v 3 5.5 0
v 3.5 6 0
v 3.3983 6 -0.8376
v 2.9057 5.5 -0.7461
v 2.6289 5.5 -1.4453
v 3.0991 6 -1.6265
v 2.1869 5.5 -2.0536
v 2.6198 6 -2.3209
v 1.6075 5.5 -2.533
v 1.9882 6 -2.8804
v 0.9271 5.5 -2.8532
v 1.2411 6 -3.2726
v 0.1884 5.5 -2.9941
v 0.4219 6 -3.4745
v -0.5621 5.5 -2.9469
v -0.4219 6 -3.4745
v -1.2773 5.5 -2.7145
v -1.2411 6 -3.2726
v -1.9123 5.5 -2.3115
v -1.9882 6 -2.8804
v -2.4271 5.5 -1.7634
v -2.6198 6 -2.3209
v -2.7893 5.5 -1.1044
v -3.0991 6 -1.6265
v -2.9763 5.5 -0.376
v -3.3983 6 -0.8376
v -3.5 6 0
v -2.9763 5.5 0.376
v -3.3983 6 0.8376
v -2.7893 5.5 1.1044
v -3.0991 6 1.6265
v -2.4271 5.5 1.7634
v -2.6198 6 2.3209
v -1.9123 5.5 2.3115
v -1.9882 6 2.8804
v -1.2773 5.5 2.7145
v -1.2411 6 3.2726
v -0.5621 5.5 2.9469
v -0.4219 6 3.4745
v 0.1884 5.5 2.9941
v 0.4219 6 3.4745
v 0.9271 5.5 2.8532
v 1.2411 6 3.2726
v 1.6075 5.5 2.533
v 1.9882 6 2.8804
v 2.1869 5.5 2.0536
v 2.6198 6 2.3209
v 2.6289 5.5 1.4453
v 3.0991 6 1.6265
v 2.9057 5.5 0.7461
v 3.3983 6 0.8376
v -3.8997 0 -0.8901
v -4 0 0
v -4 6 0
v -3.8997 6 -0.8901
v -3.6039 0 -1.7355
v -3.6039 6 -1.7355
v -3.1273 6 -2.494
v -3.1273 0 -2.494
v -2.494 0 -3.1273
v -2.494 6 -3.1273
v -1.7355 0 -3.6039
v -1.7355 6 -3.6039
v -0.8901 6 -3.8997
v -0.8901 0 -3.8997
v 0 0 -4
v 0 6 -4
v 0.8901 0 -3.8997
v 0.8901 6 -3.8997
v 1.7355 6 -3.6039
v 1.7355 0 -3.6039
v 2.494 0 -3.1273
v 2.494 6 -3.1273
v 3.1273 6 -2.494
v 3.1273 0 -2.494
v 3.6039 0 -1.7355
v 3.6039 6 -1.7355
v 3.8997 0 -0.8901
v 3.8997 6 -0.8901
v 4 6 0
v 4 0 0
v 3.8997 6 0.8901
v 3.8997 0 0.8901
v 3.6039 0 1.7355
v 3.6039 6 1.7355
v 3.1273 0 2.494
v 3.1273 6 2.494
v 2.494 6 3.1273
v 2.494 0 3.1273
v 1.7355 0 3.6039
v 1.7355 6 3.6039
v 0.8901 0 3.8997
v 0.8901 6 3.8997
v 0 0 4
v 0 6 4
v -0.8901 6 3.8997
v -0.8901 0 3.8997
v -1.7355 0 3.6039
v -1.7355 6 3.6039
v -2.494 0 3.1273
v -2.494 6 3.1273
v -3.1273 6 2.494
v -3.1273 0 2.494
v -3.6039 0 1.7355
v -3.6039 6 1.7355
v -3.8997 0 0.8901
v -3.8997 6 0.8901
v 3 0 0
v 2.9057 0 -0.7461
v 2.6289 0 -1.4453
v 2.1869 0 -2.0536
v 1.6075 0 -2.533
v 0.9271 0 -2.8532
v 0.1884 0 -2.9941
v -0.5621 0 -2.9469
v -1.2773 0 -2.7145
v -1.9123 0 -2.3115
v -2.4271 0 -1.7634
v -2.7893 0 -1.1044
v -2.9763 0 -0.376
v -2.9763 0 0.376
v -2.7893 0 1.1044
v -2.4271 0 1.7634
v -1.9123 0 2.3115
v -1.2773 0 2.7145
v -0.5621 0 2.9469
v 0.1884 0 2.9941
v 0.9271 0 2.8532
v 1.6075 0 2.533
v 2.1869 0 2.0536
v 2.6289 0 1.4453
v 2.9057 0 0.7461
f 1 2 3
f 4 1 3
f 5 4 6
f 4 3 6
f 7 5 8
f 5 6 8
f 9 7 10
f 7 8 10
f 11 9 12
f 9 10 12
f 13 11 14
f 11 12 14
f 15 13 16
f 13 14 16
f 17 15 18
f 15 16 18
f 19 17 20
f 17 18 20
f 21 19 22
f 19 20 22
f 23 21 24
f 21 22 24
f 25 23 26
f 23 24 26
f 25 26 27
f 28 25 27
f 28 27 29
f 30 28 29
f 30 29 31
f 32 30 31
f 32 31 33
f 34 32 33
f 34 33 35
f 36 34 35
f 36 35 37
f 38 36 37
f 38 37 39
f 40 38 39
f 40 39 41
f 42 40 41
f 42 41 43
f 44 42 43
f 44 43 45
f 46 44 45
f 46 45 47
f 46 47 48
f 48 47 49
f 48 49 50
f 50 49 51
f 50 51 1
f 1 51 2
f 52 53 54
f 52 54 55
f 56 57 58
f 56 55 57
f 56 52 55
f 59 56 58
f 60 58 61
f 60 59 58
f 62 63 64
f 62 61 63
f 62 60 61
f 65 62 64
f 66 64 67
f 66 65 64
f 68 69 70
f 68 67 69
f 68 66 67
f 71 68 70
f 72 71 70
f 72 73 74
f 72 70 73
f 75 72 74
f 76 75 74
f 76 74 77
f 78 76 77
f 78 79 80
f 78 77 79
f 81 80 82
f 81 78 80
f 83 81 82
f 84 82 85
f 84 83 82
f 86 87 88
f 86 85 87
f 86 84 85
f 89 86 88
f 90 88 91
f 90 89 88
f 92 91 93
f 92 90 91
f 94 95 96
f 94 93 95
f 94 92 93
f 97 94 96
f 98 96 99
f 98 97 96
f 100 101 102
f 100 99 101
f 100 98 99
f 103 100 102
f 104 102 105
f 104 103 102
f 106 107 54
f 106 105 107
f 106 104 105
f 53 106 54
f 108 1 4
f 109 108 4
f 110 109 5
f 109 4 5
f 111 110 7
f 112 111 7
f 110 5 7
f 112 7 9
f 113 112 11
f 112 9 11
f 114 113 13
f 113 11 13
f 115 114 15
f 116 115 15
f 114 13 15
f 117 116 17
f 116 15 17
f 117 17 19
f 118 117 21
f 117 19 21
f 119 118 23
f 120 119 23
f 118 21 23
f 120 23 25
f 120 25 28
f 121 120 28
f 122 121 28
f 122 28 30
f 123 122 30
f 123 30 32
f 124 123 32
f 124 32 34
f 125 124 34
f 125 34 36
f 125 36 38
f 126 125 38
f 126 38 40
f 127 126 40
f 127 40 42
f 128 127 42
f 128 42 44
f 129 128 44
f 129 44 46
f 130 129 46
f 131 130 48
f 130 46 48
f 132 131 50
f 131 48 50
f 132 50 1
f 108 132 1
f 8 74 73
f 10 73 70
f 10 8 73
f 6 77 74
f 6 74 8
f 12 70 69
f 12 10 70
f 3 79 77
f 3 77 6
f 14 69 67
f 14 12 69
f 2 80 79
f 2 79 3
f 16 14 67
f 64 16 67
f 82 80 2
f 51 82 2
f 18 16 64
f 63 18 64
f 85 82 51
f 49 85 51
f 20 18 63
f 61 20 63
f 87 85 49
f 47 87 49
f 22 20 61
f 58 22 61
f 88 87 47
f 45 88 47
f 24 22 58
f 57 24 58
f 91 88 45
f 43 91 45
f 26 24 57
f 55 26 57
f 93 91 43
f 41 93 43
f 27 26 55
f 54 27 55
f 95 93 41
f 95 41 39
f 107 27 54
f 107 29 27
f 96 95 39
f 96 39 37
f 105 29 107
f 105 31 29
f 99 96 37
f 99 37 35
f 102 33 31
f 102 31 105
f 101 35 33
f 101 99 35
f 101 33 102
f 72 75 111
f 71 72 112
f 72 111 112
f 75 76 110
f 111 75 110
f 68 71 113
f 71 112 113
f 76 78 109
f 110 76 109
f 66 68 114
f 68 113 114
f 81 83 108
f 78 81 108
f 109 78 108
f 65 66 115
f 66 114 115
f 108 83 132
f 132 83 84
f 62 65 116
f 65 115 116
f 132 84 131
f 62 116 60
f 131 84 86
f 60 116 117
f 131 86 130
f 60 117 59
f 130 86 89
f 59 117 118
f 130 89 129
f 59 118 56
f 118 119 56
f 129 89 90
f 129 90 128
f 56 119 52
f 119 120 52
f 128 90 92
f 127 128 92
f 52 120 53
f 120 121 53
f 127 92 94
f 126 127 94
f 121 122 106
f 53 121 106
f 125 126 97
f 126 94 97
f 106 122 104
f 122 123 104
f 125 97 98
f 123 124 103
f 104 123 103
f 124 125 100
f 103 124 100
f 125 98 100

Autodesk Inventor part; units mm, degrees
ref_plane "YZ Plane" through (0, 0, 0) normal (1, 0, 0) x (0, 1, 0)
ref_plane "XZ Plane" through (0, 0, 0) normal (0, 1, 0) x (-1, 0, 0)
ref_plane "XY Plane" through (0, 0, 0) normal (0, 0, 1) x (1, 0, 0)
sketch "Sketch1" plane through (0, 0, 0) normal (0, 1, 0) x (-1, 0, 0)
  circle A0 centre (0, 0) radius 4
  dimension "d0" = 8
extrude "Extrusion1" add sketch "Sketch1" along normal blind 6
sketch "Sketch2" plane through (0, 6, 0) normal (0, 1, 0) x (1, 0, 0)
  circle A0 centre (0, 0) radius 4 projected
  circle A1 centre (0, 0) radius 3
  dimension "d3" = 6
extrude "Extrusion2" cut sketch "Sketch2" against normal up to next contours A1
chamfer "Chamfer1" distance 0.5 angle 45 1 edges at (-3, 6, 0)
properties part number "E3DBowdenInsert" material "Brass, Soft Yellow"
